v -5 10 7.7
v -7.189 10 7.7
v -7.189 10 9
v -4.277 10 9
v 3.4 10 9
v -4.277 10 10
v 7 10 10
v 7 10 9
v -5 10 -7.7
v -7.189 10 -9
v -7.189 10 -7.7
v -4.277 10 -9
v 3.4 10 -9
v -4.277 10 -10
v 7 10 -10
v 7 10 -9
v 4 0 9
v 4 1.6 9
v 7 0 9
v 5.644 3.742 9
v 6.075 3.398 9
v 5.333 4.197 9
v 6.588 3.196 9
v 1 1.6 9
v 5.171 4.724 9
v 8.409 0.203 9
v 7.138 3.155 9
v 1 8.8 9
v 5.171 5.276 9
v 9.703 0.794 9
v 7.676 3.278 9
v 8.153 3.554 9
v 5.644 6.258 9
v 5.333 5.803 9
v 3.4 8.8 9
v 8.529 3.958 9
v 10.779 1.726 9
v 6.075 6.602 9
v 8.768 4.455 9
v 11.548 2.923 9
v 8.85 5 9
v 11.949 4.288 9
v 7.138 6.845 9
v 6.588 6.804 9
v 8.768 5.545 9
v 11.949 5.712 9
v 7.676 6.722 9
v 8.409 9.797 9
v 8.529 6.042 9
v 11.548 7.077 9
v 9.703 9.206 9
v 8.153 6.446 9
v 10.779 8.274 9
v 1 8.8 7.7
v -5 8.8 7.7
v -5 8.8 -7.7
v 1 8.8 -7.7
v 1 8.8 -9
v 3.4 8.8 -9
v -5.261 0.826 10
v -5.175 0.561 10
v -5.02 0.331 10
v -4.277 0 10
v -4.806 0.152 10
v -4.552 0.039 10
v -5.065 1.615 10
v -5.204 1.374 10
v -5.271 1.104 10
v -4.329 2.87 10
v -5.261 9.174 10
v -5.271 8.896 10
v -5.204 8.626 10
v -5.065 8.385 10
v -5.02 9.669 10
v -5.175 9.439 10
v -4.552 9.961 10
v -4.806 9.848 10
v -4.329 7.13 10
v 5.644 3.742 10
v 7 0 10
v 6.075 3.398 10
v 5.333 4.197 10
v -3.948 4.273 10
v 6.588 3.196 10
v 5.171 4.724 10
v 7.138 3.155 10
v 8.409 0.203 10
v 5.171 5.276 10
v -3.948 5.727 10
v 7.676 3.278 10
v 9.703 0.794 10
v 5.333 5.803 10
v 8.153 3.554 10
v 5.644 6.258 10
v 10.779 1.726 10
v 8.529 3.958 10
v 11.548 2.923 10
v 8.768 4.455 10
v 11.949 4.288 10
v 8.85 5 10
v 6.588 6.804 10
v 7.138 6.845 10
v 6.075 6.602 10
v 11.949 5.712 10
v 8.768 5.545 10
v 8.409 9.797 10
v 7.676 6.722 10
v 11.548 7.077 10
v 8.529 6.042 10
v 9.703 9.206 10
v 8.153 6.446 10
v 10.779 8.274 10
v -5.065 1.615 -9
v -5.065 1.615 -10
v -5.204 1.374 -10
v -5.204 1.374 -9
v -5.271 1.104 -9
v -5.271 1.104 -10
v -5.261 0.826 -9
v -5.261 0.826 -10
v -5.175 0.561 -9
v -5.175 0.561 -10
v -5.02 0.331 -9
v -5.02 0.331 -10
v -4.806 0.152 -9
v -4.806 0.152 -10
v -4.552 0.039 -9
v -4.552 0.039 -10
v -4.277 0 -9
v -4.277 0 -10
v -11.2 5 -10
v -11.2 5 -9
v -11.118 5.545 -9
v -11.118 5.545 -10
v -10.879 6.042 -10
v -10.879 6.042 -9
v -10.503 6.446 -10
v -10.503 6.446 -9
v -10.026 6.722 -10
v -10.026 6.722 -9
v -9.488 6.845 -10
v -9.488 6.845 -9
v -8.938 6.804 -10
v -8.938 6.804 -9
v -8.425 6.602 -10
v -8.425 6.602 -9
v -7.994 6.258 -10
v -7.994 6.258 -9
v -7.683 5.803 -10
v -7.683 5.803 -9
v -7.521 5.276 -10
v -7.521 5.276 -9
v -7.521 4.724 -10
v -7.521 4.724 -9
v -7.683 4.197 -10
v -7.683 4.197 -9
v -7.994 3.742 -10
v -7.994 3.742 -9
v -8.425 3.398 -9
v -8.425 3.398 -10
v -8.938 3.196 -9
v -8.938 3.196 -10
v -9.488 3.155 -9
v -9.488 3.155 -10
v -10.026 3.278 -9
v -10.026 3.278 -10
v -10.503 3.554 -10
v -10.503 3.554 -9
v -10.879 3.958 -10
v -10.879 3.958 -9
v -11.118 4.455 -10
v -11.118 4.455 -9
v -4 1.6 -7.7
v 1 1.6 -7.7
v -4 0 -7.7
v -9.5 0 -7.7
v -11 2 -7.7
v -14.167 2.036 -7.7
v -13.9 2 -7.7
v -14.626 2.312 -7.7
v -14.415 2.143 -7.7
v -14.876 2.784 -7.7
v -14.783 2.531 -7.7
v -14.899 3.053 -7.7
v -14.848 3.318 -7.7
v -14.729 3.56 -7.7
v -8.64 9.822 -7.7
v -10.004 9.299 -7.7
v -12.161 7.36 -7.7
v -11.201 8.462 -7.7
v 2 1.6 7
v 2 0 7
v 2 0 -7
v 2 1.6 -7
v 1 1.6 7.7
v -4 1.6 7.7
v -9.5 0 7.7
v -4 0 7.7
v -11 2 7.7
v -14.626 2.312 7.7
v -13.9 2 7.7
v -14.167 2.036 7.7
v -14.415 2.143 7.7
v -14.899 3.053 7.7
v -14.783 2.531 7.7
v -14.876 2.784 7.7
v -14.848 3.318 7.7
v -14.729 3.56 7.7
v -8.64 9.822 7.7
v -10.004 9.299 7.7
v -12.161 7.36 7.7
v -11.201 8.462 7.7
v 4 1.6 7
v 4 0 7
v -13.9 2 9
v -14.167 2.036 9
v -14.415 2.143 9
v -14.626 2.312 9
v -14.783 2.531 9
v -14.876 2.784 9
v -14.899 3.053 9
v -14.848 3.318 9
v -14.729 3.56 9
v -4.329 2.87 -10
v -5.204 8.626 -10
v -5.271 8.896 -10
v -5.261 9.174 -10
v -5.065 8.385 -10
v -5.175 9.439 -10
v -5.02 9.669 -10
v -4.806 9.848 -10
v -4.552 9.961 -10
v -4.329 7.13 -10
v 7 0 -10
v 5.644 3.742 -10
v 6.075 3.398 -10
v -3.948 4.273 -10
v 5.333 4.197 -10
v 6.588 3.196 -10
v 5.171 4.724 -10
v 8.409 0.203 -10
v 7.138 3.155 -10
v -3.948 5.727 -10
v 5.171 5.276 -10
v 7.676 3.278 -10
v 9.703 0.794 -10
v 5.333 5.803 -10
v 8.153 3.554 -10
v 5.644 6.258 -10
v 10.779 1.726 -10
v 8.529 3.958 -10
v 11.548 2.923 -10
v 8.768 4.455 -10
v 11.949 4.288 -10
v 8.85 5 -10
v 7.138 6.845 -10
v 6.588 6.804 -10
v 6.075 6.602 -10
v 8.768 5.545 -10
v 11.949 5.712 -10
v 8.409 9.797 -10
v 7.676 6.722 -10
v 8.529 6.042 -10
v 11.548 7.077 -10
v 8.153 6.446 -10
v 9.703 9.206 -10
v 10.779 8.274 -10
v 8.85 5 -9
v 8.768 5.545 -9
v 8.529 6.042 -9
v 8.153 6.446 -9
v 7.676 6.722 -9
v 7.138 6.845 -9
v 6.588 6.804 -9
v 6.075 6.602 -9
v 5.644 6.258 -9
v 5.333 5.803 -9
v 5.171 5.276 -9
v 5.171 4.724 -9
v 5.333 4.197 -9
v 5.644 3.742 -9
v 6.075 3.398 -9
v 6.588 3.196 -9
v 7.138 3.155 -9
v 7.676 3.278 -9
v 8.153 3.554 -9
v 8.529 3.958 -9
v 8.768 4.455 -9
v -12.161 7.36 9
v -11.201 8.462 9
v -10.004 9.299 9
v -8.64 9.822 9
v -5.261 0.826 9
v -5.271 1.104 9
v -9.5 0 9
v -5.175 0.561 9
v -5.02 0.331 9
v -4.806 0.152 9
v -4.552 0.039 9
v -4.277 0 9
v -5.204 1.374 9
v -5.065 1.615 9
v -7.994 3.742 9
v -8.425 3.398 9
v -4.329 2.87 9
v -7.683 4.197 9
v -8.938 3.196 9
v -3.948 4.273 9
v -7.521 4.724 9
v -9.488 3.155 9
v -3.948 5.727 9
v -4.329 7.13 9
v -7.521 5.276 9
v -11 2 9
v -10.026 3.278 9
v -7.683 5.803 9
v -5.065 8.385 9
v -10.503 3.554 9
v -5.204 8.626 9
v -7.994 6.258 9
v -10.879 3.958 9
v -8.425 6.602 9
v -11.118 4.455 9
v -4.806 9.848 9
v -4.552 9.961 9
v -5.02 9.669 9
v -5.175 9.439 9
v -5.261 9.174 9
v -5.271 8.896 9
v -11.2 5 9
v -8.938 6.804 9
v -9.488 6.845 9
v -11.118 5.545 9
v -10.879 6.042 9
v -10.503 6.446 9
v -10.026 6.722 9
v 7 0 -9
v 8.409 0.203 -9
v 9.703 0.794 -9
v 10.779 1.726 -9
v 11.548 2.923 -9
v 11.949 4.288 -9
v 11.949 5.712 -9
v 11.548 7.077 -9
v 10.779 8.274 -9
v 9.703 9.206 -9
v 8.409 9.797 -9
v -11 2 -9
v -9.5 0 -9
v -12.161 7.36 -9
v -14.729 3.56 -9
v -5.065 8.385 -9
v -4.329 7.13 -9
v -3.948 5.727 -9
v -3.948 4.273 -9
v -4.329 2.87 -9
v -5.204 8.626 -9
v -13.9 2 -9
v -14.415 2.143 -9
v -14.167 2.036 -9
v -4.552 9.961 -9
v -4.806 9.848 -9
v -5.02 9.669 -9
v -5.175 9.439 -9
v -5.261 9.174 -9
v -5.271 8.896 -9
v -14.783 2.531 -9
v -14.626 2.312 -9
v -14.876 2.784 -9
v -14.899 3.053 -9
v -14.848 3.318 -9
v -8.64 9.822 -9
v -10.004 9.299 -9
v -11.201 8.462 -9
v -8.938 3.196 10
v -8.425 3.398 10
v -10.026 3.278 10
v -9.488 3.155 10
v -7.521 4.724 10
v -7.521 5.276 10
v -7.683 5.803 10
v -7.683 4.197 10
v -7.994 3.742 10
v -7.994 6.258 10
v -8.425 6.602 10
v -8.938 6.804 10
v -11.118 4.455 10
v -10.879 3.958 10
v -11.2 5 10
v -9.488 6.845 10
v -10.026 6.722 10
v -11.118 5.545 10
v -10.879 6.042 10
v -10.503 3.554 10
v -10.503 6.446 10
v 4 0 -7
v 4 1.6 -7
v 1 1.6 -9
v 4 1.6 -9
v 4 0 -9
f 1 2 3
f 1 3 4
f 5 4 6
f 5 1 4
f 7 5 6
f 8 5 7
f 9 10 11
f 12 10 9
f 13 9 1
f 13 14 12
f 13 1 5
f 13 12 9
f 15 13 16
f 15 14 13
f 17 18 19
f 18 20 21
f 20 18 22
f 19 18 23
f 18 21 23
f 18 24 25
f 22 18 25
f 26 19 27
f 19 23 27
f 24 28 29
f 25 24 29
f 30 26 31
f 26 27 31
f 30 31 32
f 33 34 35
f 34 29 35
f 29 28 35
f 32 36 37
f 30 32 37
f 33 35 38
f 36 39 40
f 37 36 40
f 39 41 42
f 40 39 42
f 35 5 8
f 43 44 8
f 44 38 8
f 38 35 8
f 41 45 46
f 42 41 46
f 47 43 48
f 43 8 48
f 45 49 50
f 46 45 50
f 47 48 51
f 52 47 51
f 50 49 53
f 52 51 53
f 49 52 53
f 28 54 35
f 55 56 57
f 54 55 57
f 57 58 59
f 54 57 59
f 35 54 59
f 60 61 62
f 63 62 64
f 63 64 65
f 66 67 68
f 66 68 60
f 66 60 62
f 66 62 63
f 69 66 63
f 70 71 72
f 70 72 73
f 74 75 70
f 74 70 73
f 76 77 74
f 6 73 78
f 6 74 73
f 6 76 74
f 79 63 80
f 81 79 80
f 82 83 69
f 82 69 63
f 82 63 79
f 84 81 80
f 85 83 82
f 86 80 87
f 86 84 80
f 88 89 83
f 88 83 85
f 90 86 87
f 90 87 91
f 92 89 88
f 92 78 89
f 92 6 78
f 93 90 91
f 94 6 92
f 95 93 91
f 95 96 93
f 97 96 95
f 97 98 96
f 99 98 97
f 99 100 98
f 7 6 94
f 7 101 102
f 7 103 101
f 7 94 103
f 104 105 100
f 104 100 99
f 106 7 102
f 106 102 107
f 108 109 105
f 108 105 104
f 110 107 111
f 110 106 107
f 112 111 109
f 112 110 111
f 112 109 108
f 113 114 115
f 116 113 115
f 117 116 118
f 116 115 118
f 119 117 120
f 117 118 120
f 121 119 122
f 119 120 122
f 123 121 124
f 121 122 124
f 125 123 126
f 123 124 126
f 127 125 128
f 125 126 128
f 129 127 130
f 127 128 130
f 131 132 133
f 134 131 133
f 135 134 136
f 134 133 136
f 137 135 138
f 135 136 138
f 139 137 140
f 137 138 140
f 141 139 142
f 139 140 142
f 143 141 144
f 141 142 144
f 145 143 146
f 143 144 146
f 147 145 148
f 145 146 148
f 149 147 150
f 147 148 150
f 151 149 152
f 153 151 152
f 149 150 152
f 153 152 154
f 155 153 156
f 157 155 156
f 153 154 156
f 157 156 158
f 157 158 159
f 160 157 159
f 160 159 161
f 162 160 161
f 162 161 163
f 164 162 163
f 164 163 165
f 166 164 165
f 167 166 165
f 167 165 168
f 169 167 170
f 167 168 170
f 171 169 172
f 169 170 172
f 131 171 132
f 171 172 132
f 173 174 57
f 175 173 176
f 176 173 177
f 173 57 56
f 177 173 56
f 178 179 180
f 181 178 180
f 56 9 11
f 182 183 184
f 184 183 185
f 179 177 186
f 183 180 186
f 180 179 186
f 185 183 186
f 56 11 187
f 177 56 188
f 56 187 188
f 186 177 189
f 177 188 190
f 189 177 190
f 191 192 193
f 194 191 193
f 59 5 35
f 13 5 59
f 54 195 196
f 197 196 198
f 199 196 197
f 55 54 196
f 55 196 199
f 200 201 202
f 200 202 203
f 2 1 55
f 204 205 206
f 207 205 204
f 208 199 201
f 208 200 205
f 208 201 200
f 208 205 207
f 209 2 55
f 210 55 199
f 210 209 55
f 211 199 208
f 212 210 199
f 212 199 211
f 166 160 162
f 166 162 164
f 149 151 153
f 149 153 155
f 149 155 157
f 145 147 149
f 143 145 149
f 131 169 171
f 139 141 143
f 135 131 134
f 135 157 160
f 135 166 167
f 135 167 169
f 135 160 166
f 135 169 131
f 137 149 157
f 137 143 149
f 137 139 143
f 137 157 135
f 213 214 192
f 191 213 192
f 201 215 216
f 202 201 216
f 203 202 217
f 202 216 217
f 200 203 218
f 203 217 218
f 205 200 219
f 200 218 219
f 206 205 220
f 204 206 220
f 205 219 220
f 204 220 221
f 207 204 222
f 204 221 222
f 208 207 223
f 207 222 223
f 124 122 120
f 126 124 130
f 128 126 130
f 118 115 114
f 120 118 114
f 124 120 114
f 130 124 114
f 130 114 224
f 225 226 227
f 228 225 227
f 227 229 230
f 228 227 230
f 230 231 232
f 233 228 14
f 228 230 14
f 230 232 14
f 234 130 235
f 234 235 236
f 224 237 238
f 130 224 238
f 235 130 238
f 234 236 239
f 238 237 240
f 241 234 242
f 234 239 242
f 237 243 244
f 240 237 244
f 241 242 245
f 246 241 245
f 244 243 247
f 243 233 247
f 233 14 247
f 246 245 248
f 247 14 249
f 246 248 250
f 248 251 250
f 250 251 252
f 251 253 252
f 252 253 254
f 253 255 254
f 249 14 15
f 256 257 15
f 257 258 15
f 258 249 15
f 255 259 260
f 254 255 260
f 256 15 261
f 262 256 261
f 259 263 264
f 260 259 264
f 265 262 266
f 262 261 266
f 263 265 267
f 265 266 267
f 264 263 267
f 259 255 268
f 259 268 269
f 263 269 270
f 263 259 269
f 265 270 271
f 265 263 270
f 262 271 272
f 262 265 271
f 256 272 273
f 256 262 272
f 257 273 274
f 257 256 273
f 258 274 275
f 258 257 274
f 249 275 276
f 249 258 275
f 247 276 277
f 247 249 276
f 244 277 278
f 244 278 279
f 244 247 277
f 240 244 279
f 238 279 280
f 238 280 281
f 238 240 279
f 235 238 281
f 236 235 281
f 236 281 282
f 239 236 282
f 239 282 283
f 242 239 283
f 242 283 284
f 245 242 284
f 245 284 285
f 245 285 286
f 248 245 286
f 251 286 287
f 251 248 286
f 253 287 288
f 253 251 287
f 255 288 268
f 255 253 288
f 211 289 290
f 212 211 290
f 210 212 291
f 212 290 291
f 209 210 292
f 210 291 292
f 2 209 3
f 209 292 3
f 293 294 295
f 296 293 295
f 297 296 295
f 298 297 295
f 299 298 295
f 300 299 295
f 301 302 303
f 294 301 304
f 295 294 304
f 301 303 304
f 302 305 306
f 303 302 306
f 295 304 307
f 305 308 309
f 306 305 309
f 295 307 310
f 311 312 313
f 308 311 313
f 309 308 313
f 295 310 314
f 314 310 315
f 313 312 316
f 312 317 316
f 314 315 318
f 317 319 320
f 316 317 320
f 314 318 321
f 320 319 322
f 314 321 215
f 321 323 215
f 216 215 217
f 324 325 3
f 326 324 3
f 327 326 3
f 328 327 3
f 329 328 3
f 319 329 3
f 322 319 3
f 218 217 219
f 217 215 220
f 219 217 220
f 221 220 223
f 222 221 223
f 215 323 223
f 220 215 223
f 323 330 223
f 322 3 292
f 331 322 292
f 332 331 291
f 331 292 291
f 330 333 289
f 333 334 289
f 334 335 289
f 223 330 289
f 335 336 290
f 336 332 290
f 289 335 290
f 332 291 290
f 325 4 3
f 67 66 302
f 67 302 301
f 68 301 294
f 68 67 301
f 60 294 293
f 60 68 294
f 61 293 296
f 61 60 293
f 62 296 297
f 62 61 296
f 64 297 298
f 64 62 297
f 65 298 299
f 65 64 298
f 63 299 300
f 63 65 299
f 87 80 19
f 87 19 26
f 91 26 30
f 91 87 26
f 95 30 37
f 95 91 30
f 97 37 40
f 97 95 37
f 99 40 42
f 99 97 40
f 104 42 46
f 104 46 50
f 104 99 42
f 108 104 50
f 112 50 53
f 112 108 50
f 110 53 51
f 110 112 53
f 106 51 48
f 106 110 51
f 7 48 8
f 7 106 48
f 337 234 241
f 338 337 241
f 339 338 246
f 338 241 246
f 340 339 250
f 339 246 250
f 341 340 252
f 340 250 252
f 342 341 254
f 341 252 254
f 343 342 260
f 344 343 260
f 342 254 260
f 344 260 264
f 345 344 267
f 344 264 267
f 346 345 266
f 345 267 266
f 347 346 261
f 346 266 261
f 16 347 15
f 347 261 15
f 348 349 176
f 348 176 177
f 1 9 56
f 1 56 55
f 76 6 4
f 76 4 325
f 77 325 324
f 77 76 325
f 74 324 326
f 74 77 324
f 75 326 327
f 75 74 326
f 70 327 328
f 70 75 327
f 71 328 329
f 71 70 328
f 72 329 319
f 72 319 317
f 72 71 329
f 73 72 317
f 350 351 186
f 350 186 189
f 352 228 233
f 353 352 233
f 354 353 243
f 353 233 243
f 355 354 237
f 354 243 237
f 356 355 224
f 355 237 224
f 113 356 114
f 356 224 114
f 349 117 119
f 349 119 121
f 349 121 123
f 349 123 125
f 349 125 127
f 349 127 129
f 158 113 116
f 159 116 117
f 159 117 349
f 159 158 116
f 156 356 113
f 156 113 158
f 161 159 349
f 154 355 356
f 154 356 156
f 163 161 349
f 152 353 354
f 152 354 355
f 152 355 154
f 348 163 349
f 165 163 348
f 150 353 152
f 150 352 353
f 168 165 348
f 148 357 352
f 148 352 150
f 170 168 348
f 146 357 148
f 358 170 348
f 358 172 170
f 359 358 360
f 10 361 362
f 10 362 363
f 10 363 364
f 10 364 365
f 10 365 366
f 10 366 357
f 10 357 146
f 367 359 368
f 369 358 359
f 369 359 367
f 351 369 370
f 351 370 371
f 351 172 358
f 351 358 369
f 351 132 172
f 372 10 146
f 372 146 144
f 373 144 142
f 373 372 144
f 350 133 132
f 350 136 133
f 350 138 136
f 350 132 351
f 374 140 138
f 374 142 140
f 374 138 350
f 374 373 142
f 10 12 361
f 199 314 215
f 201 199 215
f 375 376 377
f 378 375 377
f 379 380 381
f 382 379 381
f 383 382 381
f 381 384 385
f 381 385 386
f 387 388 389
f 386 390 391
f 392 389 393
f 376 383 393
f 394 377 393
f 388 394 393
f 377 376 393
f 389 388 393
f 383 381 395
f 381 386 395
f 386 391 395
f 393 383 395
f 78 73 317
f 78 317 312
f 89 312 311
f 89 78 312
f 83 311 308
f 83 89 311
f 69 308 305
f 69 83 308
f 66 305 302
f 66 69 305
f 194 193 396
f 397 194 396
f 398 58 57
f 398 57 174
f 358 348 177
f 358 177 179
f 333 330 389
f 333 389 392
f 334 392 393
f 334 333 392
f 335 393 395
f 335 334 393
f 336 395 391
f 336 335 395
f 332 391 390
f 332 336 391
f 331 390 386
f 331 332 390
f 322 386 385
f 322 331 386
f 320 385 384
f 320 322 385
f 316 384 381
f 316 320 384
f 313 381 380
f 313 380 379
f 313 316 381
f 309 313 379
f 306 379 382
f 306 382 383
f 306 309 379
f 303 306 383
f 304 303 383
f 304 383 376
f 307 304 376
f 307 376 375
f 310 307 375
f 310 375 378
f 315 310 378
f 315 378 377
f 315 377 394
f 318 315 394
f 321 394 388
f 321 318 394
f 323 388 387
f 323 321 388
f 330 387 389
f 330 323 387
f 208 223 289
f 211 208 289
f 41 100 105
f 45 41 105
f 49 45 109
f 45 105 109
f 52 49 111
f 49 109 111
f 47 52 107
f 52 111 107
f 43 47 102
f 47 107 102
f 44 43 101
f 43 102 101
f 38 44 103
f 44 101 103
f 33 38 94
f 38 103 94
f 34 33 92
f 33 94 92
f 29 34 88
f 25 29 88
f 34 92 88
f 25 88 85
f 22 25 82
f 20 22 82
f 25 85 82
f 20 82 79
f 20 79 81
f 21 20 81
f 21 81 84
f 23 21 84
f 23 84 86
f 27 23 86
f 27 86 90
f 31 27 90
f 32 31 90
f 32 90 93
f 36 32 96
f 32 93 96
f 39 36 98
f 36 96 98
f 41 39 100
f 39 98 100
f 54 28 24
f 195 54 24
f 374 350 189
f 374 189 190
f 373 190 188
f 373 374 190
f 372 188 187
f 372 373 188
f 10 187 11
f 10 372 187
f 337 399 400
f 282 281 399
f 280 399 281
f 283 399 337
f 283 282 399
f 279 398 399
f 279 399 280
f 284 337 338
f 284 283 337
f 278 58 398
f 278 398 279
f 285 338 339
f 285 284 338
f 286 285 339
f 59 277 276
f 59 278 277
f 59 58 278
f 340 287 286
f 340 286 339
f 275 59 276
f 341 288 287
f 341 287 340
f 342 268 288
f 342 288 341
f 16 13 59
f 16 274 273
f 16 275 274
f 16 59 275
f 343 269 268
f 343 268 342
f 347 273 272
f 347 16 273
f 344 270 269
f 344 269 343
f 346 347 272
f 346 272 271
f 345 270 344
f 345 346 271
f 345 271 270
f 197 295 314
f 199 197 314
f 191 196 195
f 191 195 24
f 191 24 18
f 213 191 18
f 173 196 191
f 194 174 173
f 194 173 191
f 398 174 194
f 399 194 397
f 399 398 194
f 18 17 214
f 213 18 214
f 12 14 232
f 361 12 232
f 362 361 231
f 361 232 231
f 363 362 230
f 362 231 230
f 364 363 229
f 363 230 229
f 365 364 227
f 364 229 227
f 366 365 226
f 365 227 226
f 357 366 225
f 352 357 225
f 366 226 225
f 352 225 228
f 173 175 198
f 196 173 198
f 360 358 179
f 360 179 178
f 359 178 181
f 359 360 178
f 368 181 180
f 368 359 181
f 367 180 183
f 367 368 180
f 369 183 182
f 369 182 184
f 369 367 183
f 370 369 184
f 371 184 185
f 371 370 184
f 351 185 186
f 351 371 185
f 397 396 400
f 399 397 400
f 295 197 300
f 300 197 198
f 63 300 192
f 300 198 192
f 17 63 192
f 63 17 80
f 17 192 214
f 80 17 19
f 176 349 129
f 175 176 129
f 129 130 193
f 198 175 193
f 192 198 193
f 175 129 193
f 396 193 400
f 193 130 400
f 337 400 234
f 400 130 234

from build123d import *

# Parameters (mm, degrees)
BASE_DEPTH          = 1.6
SKETCH4_R           = 1.85
ONESIDE_DEPTH       = 1
ANOTHERSIDE_DEPTH   = 1.3
SKETCH5_3_R         = 1.85
PIN_DEPTH           = 1
BOSS_EXTRUDE9_DEPTH = 1.2


with BuildPart() as part:
    # Sketch3 → Base (new body)
    with BuildSketch(Plane(origin=(0, 0, 0), x_dir=(1, 0, 0), z_dir=(0, 1, 0))):
        Polygon((4, 7), (4, 10), (-4, 10), (-4, -10), (4, -10), (4, -7), (2, -7), (2, 7), align=None)
    extrude(amount=BASE_DEPTH)

    # Sketch4 → OneSide (add)
    with BuildSketch(Plane.XY.offset(10)):
        with BuildLine():
            ThreePointArc((-5.064751599, 1.615384615), (-5.175241651, 0.56147099), (-4.276524617, 0))
            Line((-4.276524617, 0), (-4, 0))
            Line((-4, 0), (-4, 1.6))
            Line((-4, 1.6), (4, 1.6))
            Line((4, 1.6), (4, 0))
            Line((4, 0), (7, 0))
            ThreePointArc((7, 0), (12, 5), (7, 10))
            Line((7, 10), (-4.276524617, 10))
            ThreePointArc((-4.276524617, 10), (-5.175241651, 9.43852901), (-5.064751599, 8.384615385))
            ThreePointArc((-5.064751599, 8.384615385), (-3.9, 5), (-5.064751599, 1.615384615))
        make_face()
        with Locations((7, 5)):
            Circle(SKETCH4_R, mode=Mode.SUBTRACT)
    oneside = extrude(amount=-ONESIDE_DEPTH)

    # Sketch5 → AnotherSide (add)
    with BuildSketch(Plane(origin=(0, 0, 9), x_dir=(-1, 0, 0), z_dir=(0, 0, -1))):
        with BuildLine():
            Line((-1, 10), (-1, 0))
            Line((-1, 0), (9.5, 0))
            Line((9.5, 0), (11, 2))
            Line((11, 2), (13.9, 2))
            ThreePointArc((13.9, 2), (14.783156083, 2.530920761), (14.728540367, 3.559929335))
            Line((14.728540367, 3.559929335), (12.160731096, 7.35957601))
            ThreePointArc((12.160731096, 7.35957601), (10.003964328, 9.2989365), (7.189488894, 10))
            Line((7.189488894, 10), (-1, 10))
        make_face()
    anotherside = extrude(amount=ANOTHERSIDE_DEPTH)

    # Sketch5<3> → Pin (add)
    with BuildSketch(Plane(origin=(0, 0, 9), x_dir=(-1, 0, 0), z_dir=(0, 0, -1))):
        with Locations((9.35, 5)):
            Circle(SKETCH5_3_R)
    pin = extrude(amount=-PIN_DEPTH)

    # Mirror1: OneSide, AnotherSide, Pin across plane
    add(oneside.mirror(Plane.XY))
    add(anotherside.mirror(Plane.XY))
    add(pin.mirror(Plane.XY))

    # Sketch6 → Boss-Extrude9 (add)
    with BuildSketch(Plane(origin=(0, 10, 0), x_dir=(1, 0, 0), z_dir=(0, 1, 0))):
        Polygon((-5, 8.547893693), (-5, -8.525702736), (3.4, -9.520454617), (3.4, 9.588680541), align=None)
    extrude(amount=-BOSS_EXTRUDE9_DEPTH)


solid = part.part
